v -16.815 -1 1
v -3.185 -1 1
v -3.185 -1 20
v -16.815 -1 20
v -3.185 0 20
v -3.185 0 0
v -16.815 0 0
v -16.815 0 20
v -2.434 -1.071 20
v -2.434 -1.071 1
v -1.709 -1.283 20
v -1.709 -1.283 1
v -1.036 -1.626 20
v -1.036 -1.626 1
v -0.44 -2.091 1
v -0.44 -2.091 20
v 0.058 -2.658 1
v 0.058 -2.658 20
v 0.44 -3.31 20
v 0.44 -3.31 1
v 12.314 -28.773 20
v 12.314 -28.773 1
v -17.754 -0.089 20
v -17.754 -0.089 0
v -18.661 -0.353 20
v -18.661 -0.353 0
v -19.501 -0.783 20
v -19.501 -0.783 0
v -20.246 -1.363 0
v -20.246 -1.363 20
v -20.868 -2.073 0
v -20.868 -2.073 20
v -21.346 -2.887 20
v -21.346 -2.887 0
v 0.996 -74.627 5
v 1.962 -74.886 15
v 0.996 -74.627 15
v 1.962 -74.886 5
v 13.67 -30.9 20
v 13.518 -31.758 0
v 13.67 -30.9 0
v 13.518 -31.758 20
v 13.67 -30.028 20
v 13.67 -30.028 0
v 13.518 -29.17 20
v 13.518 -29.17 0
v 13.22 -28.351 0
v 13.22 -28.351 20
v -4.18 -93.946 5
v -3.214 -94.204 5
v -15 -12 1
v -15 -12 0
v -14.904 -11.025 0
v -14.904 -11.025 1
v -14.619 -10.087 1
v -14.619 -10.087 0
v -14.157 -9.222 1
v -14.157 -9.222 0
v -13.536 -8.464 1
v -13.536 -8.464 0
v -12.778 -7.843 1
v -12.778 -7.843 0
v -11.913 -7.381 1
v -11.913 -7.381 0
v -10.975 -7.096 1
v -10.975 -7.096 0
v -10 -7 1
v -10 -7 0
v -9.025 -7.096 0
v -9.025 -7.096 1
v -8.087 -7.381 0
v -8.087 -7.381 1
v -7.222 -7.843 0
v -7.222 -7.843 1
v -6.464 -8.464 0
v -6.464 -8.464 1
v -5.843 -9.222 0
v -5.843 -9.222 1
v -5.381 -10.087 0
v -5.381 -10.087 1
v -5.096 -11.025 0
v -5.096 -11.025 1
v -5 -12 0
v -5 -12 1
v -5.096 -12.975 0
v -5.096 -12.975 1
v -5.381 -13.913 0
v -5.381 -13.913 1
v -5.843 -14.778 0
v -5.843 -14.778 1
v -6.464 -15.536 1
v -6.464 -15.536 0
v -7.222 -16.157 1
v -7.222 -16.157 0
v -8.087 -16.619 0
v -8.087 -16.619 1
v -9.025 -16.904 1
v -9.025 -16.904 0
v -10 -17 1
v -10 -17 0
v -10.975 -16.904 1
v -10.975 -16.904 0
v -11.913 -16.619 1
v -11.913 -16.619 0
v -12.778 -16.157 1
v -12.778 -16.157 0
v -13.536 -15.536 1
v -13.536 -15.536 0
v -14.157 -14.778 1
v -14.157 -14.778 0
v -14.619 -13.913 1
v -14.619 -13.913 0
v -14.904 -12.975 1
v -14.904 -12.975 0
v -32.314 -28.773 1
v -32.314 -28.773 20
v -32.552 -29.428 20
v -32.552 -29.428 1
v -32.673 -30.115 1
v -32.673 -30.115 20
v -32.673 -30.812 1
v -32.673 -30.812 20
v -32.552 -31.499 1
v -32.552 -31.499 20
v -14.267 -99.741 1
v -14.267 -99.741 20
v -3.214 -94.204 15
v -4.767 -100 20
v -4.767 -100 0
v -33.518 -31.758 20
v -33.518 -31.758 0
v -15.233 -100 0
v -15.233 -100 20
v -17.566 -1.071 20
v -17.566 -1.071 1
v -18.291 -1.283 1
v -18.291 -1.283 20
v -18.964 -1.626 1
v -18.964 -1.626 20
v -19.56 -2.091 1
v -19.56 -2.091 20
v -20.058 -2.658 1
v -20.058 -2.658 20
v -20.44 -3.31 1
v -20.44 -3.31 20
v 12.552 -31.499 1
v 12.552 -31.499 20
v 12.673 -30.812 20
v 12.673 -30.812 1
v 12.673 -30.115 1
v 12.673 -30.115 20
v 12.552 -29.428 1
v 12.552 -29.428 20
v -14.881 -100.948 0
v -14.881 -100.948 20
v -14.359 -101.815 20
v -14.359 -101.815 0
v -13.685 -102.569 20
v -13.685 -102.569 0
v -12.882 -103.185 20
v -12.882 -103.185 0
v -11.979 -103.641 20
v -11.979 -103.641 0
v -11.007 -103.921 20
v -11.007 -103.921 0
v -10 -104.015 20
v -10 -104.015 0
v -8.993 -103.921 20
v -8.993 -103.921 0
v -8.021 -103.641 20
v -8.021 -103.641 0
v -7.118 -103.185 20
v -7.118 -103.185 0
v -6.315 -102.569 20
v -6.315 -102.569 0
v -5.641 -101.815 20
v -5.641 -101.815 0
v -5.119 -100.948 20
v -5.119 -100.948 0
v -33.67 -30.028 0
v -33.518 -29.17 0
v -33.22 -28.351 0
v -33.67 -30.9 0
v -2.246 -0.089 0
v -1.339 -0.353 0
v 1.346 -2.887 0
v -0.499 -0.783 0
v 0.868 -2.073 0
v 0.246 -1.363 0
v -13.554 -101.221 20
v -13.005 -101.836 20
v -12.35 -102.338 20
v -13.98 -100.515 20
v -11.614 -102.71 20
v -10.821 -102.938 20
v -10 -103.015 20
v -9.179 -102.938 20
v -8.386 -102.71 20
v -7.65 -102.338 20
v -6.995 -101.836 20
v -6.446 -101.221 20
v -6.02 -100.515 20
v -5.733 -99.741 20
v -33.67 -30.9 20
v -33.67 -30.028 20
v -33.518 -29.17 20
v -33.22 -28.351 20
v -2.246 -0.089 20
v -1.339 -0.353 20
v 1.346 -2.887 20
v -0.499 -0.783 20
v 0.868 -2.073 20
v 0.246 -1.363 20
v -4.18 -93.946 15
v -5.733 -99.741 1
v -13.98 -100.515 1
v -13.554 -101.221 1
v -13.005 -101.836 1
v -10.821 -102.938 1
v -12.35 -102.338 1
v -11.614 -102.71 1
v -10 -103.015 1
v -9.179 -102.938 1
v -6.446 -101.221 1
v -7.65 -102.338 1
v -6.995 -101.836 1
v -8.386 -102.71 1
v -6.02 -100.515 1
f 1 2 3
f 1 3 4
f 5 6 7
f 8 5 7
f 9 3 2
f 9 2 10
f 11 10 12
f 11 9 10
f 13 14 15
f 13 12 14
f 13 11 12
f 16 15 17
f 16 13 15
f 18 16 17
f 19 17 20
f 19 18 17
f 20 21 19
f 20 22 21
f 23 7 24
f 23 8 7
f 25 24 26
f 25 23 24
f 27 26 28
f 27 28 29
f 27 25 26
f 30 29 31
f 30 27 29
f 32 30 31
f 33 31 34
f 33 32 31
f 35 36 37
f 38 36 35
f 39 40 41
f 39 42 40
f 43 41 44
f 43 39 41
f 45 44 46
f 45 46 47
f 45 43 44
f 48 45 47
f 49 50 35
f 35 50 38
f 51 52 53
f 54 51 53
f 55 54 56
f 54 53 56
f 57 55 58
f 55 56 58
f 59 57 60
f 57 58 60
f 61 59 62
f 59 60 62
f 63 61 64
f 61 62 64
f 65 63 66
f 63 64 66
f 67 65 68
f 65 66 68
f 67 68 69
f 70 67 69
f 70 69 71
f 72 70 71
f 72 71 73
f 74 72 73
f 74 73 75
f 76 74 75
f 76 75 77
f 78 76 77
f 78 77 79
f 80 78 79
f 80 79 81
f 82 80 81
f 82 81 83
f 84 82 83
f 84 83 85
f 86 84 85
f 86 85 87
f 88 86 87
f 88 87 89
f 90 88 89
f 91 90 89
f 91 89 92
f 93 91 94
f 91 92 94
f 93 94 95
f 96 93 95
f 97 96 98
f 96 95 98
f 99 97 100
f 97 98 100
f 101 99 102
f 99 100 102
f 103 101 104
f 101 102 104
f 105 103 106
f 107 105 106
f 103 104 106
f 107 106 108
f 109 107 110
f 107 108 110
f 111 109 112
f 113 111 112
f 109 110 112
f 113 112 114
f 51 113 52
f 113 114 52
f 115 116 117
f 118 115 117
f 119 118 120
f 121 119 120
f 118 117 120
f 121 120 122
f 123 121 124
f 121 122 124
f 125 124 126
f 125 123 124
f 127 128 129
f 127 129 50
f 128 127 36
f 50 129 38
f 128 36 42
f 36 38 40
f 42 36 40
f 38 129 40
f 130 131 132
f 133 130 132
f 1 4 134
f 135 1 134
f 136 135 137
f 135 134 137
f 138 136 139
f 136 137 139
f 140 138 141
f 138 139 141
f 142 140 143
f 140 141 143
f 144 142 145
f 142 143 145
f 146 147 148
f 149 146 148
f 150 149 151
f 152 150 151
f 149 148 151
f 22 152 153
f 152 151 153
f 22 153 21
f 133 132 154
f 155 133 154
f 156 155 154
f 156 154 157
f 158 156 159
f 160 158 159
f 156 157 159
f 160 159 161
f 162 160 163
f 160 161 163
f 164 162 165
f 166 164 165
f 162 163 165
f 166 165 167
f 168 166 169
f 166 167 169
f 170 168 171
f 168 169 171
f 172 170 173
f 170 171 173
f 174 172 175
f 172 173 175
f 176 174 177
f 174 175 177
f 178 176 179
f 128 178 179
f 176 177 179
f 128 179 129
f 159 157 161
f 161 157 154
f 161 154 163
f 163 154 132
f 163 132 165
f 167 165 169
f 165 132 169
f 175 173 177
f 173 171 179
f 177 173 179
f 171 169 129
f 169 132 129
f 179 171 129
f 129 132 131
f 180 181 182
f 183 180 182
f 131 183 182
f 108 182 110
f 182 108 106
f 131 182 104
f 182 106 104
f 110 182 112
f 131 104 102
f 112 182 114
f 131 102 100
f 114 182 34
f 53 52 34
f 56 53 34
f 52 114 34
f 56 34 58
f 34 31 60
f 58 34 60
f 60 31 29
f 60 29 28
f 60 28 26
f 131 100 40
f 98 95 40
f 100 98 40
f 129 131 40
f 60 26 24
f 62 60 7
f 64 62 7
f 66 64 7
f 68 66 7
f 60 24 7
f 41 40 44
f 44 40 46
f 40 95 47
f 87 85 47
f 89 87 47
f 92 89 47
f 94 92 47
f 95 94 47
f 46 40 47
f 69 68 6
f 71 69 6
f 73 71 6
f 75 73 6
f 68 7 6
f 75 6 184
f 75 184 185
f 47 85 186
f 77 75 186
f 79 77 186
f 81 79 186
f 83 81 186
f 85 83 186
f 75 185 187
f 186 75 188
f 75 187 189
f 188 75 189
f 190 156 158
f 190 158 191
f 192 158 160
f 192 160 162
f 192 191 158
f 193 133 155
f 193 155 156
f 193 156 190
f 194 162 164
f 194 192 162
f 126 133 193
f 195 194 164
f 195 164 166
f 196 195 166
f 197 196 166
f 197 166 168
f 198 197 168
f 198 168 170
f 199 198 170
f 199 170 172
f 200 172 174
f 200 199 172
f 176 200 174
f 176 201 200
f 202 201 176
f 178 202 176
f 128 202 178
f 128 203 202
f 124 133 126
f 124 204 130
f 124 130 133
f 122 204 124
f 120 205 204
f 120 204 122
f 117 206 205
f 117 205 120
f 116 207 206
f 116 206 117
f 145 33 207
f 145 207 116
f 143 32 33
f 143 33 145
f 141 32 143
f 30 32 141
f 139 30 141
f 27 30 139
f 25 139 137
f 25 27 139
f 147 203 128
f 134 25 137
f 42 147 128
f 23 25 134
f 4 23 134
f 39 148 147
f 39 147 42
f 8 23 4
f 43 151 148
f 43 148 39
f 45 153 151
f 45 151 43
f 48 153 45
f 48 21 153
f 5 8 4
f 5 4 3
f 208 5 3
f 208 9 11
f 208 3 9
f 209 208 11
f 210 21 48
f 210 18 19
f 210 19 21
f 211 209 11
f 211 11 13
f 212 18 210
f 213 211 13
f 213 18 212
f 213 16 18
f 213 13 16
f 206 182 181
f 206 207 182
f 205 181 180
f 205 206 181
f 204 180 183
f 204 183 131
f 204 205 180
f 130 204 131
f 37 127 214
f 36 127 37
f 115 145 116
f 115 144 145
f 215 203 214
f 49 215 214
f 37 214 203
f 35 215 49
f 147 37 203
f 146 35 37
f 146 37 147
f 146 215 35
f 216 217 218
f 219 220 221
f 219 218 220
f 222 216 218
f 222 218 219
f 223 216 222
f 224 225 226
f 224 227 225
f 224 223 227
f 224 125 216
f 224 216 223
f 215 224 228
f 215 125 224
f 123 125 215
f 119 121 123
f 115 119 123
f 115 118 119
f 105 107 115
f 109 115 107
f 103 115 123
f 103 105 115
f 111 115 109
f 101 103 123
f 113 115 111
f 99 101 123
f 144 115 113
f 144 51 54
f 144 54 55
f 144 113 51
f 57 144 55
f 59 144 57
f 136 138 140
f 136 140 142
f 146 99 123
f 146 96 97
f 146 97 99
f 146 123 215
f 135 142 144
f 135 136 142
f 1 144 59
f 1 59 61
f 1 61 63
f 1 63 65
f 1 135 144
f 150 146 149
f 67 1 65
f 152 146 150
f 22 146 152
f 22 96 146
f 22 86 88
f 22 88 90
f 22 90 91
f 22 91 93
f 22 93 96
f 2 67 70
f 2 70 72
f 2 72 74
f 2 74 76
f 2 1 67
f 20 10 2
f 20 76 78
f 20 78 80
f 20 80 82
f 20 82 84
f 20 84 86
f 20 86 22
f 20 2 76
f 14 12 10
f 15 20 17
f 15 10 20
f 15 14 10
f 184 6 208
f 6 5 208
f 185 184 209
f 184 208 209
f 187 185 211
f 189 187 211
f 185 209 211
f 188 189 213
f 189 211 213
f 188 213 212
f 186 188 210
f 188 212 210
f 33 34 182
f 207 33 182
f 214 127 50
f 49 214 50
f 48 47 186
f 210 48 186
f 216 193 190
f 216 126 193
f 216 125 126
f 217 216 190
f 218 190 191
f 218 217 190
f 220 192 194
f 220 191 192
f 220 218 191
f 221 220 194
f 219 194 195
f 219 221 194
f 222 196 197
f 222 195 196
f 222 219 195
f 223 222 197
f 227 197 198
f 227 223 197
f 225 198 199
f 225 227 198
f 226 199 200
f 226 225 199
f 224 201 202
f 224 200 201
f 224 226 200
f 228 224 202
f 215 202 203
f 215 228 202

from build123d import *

# Parameters (mm, degrees)
EXTRUDE_1_DEPTH     = 20
FILLET_1_R          = 5
SHELL_1_T           = -1
SKETCH_2_R          = 5
CUT_EXTRUDE_1_DEPTH = 20
CUT_EXTRUDE_2_REACH = 116.219
SKETCH_3_W          = 10
SKETCH_3_H          = 20


with BuildPart() as part:
    # 草图1 → 凸台-拉伸1 (new body)
    with BuildSketch(Plane.XY):
        with BuildLine():
            Line((0, 0), (-20, 0))
            Line((-20, 0), (-33.989229745, -30))
            Line((-33.989229745, -30), (-15.232786274, -100))
            ThreePointArc((-15.232786274, -100), (-10, -104.015258131), (-4.767213726, -100))
            Line((-4.767213726, -100), (13.989229745, -30))
            Line((13.989229745, -30), (0, 0))
        make_face()
    extrude(amount=EXTRUDE_1_DEPTH)

    # 圆角1
    fillet_1_edges = [part.edges().sort_by_distance(p)[0] for p in [
        (13.989229745, -30, 10),
        (-33.989229745, -30, 10),
        (-20, 0, 10),
        (0, 0, 10),
    ]]
    fillet(fillet_1_edges, radius=FILLET_1_R)

    # 抽壳1
    shell_1_openings = [part.faces().sort_by_distance(p)[0] for p in [
        (-10, -44.685846185, 20),
    ]]
    offset(amount=SHELL_1_T, openings=shell_1_openings, kind=Kind.INTERSECTION)

    # 草图2 → 切除-拉伸1 (cut)
    with BuildSketch(Plane(origin=(0, 0, 0), x_dir=(-1, 0, 0), z_dir=(0, 0, -1))):
        with Locations((10, -12)):
            Circle(SKETCH_2_R)
    extrude(amount=-CUT_EXTRUDE_1_DEPTH, mode=Mode.SUBTRACT)

    # 草图3 → 切除-拉伸2 (cut, up to next)
    with BuildSketch(Plane(origin=(20.552129041, -5.506926379, 0), x_dir=(0, 0, -1), z_dir=(0.9659258262890672, -0.2588190451025249, 0)), mode=Mode.PRIVATE) as cut_extrude_2_sk1:
        with Locations((-10, -81.826428333)):
            Rectangle(SKETCH_3_W, SKETCH_3_H)
    cut_extrude_2_tool1 = extrude(cut_extrude_2_sk1.sketch, amount=-CUT_EXTRUDE_2_REACH, mode=Mode.PRIVATE) & part.part
    add(cut_extrude_2_tool1.solids().sort_by_distance((-0.626109, -84.545187, 10))[0], mode=Mode.SUBTRACT)


solid = part.part
